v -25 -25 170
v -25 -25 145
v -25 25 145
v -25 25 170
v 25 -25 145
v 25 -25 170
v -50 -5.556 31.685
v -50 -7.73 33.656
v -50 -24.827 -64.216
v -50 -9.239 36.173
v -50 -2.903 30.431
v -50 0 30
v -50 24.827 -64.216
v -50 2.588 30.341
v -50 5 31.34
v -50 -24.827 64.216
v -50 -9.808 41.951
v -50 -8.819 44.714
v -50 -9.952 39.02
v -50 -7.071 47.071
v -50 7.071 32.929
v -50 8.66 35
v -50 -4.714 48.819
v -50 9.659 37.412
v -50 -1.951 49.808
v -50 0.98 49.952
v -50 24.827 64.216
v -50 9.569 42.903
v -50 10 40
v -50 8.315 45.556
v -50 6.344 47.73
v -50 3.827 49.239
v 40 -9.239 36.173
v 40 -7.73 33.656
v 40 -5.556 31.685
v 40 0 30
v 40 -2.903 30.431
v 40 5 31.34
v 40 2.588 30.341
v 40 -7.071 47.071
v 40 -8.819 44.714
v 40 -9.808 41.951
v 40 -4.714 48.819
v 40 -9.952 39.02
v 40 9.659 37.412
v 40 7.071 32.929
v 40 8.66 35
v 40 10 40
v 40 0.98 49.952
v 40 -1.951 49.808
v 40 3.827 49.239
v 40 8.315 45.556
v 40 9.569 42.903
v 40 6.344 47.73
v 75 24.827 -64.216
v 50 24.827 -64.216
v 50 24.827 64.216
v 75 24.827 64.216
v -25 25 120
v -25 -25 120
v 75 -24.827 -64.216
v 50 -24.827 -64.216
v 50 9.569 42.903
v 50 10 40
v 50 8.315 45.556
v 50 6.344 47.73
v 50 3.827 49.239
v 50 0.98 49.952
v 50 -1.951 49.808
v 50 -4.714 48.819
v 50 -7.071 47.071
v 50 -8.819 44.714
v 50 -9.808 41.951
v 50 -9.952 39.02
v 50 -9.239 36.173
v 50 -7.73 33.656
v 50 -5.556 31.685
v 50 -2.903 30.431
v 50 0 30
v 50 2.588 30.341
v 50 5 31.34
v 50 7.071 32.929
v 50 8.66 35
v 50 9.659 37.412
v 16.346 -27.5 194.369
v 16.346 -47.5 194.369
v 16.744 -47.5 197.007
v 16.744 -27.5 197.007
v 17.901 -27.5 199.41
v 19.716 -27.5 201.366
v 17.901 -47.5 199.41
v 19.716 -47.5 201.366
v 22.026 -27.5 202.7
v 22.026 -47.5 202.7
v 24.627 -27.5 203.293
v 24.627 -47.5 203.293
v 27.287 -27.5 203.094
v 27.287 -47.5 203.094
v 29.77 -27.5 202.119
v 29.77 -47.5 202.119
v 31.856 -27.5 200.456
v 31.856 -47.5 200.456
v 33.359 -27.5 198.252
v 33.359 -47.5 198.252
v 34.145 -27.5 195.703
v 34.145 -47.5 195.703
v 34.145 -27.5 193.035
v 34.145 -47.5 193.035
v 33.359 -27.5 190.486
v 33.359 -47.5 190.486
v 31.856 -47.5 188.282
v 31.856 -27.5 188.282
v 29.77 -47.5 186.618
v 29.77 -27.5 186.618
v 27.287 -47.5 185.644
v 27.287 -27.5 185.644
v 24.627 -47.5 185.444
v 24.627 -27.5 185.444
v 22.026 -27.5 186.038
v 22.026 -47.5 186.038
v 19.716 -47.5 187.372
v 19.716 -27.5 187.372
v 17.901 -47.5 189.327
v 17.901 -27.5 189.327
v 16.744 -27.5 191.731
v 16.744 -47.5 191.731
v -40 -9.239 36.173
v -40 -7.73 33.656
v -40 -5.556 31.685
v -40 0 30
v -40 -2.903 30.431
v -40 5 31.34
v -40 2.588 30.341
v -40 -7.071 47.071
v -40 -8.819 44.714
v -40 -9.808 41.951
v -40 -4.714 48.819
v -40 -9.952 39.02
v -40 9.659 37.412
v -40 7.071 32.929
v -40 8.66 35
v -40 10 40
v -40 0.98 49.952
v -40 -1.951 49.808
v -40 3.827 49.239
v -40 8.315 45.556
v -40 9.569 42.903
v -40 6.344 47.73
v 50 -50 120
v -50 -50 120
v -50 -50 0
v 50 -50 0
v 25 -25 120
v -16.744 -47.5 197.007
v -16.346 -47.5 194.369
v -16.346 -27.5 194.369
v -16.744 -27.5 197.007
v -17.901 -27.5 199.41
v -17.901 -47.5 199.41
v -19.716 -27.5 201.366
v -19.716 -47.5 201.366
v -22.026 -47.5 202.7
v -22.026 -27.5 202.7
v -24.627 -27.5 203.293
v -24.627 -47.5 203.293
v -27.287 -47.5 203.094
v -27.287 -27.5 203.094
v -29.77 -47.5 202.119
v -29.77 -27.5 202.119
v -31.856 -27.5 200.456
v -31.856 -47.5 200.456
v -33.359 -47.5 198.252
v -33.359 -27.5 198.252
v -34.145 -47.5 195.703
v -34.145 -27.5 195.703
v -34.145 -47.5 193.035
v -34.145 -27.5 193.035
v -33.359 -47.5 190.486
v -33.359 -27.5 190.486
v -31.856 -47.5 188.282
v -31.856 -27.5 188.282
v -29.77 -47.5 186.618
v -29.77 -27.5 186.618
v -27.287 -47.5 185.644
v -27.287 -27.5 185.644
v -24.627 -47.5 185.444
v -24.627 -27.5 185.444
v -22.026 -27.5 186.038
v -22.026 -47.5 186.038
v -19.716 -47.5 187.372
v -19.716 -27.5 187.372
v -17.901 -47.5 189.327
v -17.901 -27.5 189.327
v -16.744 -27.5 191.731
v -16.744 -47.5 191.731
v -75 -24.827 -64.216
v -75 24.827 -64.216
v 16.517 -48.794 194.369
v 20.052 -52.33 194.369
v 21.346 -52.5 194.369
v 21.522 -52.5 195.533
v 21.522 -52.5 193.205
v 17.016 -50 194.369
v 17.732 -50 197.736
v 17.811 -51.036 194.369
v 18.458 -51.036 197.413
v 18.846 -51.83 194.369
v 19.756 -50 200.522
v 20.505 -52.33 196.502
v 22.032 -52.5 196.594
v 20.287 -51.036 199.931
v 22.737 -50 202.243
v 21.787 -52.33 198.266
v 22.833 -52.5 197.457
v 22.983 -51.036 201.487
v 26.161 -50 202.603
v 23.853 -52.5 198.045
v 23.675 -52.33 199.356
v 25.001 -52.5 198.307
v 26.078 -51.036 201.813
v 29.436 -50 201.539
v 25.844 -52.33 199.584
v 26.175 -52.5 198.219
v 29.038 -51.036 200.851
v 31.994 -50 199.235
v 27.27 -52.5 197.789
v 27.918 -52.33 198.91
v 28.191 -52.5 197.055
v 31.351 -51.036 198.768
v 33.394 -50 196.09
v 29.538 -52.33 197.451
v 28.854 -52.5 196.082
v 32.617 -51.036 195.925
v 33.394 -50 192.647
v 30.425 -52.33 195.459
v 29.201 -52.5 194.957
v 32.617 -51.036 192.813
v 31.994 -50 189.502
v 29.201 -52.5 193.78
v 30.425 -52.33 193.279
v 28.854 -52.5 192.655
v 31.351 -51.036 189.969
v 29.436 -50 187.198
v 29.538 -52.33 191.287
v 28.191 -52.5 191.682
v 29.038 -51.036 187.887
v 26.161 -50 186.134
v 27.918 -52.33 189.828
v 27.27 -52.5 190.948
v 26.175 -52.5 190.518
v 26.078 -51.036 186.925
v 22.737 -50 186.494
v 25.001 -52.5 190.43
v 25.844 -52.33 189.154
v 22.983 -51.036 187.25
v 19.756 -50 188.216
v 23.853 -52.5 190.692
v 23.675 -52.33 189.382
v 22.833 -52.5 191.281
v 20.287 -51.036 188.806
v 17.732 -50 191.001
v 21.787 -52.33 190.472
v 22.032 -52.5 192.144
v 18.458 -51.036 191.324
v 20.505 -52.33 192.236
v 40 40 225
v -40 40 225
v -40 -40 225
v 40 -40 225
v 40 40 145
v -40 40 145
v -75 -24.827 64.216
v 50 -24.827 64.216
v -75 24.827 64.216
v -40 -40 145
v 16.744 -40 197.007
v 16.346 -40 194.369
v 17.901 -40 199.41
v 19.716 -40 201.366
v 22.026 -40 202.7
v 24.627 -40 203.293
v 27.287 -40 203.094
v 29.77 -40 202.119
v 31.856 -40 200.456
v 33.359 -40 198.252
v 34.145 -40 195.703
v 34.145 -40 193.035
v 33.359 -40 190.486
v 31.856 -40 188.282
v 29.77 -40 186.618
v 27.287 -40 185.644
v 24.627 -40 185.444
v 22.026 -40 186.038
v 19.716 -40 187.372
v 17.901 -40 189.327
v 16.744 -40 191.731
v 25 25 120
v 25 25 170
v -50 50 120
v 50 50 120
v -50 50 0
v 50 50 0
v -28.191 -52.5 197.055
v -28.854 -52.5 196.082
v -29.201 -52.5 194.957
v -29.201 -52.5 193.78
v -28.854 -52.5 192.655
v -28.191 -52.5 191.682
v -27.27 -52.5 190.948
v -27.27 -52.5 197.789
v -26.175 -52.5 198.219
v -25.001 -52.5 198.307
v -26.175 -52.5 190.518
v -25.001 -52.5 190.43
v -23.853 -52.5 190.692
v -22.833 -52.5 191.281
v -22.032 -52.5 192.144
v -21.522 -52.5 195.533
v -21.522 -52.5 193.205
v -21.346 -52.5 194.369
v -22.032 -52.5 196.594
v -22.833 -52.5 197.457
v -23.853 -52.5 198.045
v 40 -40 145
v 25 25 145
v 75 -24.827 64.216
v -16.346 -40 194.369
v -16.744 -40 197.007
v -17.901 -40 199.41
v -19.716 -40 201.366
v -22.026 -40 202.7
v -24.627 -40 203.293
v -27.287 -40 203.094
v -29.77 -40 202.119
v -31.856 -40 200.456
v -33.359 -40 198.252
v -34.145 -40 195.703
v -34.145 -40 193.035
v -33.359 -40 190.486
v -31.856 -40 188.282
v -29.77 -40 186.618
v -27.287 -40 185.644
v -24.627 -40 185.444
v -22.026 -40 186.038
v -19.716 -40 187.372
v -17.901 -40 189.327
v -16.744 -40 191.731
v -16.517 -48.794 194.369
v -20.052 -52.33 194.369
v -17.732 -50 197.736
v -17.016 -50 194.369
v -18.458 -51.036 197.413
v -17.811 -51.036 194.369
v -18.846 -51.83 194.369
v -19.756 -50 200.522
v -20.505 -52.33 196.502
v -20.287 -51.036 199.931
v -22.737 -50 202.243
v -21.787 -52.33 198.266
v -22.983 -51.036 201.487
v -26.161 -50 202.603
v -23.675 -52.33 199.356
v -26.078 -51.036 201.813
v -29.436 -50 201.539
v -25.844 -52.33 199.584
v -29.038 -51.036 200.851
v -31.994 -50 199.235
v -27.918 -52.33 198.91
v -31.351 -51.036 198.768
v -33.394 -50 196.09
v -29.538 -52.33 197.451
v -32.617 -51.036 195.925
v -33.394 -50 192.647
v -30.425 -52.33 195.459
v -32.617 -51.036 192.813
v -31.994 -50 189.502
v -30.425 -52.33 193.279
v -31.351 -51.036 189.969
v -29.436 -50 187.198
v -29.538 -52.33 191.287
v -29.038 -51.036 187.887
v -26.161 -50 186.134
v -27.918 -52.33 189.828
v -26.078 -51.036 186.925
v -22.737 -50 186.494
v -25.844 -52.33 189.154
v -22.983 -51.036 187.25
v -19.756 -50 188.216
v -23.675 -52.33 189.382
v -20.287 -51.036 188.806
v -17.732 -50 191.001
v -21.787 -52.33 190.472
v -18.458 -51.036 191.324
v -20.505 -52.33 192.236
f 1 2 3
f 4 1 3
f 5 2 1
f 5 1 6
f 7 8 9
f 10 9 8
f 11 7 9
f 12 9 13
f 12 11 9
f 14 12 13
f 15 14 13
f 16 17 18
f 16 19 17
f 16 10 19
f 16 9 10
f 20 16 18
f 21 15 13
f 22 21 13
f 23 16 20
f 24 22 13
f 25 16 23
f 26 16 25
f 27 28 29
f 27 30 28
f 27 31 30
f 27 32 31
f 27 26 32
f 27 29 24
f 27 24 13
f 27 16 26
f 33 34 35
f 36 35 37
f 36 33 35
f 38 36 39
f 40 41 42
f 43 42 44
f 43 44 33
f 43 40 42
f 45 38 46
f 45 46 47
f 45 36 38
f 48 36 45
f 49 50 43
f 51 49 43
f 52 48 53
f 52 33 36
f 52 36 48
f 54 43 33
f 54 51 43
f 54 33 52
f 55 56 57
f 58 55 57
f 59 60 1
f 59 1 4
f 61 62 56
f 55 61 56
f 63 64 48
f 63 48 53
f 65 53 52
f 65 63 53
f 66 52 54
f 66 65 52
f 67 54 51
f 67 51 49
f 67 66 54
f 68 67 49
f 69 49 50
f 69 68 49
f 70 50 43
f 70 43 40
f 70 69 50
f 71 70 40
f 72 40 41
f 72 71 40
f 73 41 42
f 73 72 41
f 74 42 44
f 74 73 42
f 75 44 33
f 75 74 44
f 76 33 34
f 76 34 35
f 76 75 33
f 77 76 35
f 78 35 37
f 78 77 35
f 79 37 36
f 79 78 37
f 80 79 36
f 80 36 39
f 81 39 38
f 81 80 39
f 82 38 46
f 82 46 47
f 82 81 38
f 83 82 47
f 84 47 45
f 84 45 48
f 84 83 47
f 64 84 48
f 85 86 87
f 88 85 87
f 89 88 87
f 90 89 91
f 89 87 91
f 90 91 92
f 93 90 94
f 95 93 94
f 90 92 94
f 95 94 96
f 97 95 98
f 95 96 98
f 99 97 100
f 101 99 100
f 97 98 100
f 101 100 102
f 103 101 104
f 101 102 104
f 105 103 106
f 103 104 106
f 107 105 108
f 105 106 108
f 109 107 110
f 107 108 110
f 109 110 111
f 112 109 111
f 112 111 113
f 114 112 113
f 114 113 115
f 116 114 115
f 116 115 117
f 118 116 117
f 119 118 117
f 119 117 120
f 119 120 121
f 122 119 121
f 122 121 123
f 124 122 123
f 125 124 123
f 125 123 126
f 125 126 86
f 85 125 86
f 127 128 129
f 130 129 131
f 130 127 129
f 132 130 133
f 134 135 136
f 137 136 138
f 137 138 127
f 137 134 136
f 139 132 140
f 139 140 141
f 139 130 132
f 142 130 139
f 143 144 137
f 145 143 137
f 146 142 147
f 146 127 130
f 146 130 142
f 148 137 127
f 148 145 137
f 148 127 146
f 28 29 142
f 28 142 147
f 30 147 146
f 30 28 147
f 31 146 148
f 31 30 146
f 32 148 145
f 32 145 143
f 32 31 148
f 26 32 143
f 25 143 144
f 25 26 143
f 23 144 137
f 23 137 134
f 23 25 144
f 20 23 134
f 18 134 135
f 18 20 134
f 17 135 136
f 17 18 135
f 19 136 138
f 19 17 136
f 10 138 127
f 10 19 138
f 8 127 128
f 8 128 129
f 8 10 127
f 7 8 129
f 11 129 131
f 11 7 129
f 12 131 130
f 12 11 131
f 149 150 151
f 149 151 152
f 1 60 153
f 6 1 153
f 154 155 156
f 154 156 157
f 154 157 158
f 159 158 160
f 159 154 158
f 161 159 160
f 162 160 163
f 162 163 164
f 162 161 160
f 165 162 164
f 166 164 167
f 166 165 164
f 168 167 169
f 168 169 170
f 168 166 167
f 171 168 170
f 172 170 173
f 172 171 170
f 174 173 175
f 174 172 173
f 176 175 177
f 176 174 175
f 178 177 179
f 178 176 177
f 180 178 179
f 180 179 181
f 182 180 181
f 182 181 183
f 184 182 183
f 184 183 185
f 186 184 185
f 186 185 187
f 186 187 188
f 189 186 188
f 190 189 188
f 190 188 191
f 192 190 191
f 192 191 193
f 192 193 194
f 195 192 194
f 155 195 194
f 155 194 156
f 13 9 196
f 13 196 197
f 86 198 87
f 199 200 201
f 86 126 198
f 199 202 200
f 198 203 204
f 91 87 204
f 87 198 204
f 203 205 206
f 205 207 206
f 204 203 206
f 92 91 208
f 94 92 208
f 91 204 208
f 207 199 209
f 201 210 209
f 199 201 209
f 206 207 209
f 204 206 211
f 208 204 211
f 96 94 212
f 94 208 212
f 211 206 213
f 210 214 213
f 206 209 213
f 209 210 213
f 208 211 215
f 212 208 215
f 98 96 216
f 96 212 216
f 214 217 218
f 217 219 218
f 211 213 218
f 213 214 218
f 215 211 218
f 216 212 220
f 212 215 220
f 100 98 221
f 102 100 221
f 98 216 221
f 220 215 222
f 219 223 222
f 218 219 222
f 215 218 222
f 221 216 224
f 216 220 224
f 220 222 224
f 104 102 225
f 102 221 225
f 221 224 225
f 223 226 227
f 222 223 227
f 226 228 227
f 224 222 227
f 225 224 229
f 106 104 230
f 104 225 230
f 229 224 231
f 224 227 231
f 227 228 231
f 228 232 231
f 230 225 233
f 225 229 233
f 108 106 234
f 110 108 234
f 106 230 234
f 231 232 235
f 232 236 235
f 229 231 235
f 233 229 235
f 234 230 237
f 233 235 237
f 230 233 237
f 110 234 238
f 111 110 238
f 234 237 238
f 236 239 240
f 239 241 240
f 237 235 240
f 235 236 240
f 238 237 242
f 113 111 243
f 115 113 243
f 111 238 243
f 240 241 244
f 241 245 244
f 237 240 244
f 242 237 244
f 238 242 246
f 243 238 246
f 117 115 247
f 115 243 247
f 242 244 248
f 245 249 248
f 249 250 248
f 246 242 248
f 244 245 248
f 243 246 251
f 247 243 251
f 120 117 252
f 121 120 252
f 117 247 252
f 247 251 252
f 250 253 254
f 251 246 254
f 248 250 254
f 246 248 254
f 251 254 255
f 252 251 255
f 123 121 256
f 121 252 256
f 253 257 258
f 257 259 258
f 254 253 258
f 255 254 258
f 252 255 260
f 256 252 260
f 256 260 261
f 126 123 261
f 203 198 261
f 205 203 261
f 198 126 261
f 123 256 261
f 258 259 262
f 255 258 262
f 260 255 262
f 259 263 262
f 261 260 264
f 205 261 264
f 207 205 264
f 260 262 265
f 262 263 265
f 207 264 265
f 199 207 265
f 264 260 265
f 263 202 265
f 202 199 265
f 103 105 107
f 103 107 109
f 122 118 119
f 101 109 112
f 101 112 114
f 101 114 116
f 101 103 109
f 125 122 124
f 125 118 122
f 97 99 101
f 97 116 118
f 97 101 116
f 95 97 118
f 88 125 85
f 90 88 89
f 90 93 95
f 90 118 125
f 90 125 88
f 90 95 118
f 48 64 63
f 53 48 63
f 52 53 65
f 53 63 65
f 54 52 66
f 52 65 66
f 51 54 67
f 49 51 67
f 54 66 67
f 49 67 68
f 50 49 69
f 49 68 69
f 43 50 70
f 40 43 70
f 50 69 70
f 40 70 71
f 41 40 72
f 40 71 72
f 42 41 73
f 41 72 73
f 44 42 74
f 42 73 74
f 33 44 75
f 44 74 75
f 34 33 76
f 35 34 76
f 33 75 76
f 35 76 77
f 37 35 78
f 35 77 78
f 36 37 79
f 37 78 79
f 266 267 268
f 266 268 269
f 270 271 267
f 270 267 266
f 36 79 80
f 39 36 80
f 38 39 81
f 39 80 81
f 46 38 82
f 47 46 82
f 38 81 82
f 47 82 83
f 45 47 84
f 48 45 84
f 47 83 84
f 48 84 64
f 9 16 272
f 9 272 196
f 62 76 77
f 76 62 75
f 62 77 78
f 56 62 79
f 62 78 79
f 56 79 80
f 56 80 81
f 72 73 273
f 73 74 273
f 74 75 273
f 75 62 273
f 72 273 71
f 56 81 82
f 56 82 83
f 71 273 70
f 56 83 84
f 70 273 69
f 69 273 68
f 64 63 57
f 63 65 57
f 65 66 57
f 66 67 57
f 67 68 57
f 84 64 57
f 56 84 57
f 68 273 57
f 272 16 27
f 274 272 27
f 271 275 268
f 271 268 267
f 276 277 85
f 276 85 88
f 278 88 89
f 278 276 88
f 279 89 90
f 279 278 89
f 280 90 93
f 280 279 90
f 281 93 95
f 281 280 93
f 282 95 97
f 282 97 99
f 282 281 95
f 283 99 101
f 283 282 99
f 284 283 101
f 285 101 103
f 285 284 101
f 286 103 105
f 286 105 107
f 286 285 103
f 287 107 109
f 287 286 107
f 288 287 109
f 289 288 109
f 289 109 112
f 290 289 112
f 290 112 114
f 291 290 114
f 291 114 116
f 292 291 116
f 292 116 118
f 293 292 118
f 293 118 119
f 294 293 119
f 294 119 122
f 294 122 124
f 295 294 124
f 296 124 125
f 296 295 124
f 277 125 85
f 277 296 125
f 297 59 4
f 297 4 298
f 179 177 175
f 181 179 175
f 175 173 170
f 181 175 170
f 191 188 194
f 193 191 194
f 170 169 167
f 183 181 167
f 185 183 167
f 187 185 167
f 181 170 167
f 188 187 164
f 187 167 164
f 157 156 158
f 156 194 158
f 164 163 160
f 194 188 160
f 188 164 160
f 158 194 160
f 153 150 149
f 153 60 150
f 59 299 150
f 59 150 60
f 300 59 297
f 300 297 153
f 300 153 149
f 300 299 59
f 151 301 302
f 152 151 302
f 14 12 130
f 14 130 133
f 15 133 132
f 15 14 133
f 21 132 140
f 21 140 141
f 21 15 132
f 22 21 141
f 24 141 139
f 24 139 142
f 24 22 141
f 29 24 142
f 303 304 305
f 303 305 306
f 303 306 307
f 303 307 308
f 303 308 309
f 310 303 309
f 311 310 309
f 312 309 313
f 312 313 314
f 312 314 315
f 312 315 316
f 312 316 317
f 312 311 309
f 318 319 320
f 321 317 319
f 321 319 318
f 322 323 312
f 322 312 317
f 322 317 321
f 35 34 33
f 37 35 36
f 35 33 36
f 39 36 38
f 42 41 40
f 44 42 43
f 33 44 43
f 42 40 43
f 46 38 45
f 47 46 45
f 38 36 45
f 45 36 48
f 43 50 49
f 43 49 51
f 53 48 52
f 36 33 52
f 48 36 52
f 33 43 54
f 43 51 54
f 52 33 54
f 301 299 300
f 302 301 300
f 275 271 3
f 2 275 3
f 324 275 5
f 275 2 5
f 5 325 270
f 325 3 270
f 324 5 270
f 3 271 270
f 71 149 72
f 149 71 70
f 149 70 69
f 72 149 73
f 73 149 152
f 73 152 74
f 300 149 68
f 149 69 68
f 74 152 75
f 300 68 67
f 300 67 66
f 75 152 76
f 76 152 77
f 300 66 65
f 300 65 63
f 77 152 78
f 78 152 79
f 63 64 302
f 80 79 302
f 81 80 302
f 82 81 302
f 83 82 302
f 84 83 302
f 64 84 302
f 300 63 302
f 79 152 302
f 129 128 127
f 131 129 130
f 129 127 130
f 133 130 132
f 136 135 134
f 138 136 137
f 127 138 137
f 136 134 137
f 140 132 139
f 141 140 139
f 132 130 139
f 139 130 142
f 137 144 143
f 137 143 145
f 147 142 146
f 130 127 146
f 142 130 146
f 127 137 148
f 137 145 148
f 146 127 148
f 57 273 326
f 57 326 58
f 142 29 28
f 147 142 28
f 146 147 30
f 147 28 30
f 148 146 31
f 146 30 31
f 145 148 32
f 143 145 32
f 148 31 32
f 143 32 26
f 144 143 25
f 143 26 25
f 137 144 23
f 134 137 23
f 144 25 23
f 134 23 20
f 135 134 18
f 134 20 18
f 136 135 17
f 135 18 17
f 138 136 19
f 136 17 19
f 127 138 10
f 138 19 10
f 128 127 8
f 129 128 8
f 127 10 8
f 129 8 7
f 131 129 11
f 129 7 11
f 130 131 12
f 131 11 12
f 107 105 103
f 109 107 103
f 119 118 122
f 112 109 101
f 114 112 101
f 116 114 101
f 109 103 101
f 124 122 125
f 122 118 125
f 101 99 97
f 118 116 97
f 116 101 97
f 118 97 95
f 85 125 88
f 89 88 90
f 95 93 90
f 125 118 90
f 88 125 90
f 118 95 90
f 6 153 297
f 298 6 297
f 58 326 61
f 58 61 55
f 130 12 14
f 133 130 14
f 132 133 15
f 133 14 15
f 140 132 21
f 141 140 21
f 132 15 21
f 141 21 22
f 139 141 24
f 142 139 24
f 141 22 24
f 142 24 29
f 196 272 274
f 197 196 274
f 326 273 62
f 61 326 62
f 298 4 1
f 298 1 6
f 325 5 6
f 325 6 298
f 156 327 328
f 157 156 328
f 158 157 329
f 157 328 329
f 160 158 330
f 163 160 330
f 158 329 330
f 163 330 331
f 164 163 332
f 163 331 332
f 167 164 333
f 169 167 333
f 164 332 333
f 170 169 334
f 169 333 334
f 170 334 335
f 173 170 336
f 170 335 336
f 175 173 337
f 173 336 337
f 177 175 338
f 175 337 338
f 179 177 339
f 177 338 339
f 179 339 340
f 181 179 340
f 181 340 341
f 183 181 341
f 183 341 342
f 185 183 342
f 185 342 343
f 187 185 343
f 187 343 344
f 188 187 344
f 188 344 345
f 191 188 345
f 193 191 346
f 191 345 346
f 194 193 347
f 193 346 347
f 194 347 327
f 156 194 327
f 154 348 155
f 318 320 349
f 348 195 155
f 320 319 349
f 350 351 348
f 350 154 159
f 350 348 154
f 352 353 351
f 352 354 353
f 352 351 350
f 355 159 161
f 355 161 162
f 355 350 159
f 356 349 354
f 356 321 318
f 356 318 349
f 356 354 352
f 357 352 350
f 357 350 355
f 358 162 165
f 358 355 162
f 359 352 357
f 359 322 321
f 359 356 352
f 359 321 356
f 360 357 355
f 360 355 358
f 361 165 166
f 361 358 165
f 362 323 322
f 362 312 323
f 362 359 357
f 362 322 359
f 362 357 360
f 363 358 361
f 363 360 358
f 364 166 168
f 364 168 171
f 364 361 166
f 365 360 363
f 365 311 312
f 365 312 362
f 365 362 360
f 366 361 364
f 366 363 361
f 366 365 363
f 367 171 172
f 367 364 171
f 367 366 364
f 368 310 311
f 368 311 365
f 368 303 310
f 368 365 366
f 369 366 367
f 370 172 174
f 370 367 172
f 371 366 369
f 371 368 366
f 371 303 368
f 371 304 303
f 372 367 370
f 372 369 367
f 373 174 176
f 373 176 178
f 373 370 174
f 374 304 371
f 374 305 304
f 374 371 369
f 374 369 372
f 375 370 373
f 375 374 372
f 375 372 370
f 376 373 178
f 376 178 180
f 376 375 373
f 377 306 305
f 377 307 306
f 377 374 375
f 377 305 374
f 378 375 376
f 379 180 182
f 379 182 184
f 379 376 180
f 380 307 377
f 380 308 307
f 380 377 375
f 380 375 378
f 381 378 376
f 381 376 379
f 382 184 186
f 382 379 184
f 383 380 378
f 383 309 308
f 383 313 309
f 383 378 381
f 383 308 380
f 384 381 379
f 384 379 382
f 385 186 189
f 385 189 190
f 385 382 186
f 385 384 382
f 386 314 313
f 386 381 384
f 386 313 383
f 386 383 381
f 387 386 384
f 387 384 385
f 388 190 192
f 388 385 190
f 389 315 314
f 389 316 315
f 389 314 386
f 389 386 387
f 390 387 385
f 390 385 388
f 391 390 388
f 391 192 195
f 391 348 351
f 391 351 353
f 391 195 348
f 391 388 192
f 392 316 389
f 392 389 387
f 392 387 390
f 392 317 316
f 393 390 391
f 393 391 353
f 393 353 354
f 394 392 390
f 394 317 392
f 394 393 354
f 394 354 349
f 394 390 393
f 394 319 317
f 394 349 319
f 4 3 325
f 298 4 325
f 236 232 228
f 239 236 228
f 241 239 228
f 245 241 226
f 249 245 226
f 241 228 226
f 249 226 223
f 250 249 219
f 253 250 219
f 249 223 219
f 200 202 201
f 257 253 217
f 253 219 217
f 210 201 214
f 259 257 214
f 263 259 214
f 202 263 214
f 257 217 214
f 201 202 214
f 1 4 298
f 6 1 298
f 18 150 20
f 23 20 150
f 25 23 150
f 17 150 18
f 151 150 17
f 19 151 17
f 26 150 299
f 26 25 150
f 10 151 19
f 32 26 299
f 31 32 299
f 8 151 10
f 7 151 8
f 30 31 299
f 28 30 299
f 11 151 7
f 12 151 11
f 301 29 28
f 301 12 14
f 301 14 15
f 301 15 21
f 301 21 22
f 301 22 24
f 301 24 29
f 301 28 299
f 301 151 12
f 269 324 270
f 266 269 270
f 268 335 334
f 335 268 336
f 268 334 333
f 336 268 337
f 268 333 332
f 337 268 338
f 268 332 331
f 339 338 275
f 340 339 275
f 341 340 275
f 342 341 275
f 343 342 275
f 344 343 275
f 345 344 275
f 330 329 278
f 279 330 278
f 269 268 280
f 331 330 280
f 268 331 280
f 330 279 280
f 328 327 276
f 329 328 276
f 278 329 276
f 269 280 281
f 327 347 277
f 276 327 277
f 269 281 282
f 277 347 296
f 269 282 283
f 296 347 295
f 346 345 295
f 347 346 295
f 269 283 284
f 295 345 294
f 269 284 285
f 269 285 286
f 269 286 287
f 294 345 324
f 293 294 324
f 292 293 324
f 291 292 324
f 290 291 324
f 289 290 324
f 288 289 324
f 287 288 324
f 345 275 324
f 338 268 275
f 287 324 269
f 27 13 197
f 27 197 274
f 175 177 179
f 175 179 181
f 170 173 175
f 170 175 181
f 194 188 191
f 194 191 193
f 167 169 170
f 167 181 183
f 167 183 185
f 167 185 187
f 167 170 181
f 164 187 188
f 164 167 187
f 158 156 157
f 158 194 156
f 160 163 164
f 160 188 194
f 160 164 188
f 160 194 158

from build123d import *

# Parameters (mm, degrees)
F0_W      = 100
F0_H      = 100
F1_DEPTH  = 120
F2_W      = 50
F2_H      = 50
F3_DEPTH  = 50
F5_W      = 80
F5_H      = 80
F6_DEPTH  = 80
F9_DEPTH  = 10
F10_W     = 49.6545396745
F10_H     = 64.2159506679
F11_DEPTH = 25
F15_R     = 8.949511536
F16_DEPTH = 12.5
F19_R     = 5
F19_2_R   = 5


with BuildPart() as f1:
    # F0 (on Top) → F1 (new body)
    with BuildSketch(Plane.XY):
        Rectangle(F0_W, F0_H)
    extrude(amount=F1_DEPTH)

    # F2 (on face) → F3 (join)
    with BuildSketch(Plane.XY.offset(120)):
        Rectangle(F2_W, F2_H)
    extrude(amount=F3_DEPTH)


with BuildPart() as f6:
    # F5 (on offset) → F6 (new body)
    with BuildSketch(Plane.XY.offset(145)):
        Rectangle(F5_W, F5_H)
    extrude(amount=F6_DEPTH)

    # F7: cut F1
    add(f1.part, mode=Mode.SUBTRACT)


with BuildPart() as f9:
    # F8 (on face) → F9 (new body)
    with BuildSketch(Plane.YZ.offset(50)):
        with BuildLine():
            ThreePointArc((10, 40), (-7.0710678119, 47.0710678119), (0, 30))
            ThreePointArc((0, 30), (7.0710678119, 32.9289321881), (10, 40))
        make_face()
    extrude(amount=-F9_DEPTH)

    # F10 (on face) → F11 (join)
    with BuildSketch(Plane.YZ.offset(50)):
        with Locations((0, 32.1079753339)):
            Rectangle(F10_W, F10_H)
        with Locations((0, -32.1079753339)):
            Rectangle(F10_W, F10_H)
    extrude(amount=F11_DEPTH)


with BuildPart() as f1_1:
    add(f1.part)

    # F12: cut F9
    add(f9.part, mode=Mode.SUBTRACT)


with BuildPart() as f13_1:
    # F13: instance of F9
    add(f9.part.mirror(Plane.YZ))


with BuildPart() as f1_2:
    add(f1_1.part)

    # F14: cut F13_1
    add(f13_1.part, mode=Mode.SUBTRACT)


with BuildPart() as f16:
    # F15 (on face) → F16 (new body, symmetric)
    with BuildSketch(Plane.XZ.offset(40)):
        with Locations((-25.2957064658, 194.3687796593)):
            Circle(F15_R)
    extrude(amount=F16_DEPTH, both=True)


with BuildPart() as f17_1:
    # F17: instance of F16
    add(f16.part.mirror(Plane.YZ))


with BuildPart() as f6_1:
    add(f6.part)

    # F18: cut F16, F17_1
    add(f16.part, mode=Mode.SUBTRACT)
    add(f17_1.part, mode=Mode.SUBTRACT)


with BuildPart() as f16_1:
    add(f16.part)

    # F19
    f19_edges = [f16_1.edges().sort_by_distance(p)[0] for p in [
        (-34.245218, -52.5, 194.36878),
    ]]
    fillet(f19_edges, radius=F19_R)


with BuildPart() as f17_1_1:
    add(f17_1.part)

    # F19#2
    f19_2_edges = [f17_1_1.edges().sort_by_distance(p)[0] for p in [
        (34.245218, -52.5, 194.36878),
    ]]
    fillet(f19_2_edges, radius=F19_2_R)


solid = Compound([f9.part, f13_1.part, f1_2.part, f6_1.part, f16_1.part, f17_1_1.part])
